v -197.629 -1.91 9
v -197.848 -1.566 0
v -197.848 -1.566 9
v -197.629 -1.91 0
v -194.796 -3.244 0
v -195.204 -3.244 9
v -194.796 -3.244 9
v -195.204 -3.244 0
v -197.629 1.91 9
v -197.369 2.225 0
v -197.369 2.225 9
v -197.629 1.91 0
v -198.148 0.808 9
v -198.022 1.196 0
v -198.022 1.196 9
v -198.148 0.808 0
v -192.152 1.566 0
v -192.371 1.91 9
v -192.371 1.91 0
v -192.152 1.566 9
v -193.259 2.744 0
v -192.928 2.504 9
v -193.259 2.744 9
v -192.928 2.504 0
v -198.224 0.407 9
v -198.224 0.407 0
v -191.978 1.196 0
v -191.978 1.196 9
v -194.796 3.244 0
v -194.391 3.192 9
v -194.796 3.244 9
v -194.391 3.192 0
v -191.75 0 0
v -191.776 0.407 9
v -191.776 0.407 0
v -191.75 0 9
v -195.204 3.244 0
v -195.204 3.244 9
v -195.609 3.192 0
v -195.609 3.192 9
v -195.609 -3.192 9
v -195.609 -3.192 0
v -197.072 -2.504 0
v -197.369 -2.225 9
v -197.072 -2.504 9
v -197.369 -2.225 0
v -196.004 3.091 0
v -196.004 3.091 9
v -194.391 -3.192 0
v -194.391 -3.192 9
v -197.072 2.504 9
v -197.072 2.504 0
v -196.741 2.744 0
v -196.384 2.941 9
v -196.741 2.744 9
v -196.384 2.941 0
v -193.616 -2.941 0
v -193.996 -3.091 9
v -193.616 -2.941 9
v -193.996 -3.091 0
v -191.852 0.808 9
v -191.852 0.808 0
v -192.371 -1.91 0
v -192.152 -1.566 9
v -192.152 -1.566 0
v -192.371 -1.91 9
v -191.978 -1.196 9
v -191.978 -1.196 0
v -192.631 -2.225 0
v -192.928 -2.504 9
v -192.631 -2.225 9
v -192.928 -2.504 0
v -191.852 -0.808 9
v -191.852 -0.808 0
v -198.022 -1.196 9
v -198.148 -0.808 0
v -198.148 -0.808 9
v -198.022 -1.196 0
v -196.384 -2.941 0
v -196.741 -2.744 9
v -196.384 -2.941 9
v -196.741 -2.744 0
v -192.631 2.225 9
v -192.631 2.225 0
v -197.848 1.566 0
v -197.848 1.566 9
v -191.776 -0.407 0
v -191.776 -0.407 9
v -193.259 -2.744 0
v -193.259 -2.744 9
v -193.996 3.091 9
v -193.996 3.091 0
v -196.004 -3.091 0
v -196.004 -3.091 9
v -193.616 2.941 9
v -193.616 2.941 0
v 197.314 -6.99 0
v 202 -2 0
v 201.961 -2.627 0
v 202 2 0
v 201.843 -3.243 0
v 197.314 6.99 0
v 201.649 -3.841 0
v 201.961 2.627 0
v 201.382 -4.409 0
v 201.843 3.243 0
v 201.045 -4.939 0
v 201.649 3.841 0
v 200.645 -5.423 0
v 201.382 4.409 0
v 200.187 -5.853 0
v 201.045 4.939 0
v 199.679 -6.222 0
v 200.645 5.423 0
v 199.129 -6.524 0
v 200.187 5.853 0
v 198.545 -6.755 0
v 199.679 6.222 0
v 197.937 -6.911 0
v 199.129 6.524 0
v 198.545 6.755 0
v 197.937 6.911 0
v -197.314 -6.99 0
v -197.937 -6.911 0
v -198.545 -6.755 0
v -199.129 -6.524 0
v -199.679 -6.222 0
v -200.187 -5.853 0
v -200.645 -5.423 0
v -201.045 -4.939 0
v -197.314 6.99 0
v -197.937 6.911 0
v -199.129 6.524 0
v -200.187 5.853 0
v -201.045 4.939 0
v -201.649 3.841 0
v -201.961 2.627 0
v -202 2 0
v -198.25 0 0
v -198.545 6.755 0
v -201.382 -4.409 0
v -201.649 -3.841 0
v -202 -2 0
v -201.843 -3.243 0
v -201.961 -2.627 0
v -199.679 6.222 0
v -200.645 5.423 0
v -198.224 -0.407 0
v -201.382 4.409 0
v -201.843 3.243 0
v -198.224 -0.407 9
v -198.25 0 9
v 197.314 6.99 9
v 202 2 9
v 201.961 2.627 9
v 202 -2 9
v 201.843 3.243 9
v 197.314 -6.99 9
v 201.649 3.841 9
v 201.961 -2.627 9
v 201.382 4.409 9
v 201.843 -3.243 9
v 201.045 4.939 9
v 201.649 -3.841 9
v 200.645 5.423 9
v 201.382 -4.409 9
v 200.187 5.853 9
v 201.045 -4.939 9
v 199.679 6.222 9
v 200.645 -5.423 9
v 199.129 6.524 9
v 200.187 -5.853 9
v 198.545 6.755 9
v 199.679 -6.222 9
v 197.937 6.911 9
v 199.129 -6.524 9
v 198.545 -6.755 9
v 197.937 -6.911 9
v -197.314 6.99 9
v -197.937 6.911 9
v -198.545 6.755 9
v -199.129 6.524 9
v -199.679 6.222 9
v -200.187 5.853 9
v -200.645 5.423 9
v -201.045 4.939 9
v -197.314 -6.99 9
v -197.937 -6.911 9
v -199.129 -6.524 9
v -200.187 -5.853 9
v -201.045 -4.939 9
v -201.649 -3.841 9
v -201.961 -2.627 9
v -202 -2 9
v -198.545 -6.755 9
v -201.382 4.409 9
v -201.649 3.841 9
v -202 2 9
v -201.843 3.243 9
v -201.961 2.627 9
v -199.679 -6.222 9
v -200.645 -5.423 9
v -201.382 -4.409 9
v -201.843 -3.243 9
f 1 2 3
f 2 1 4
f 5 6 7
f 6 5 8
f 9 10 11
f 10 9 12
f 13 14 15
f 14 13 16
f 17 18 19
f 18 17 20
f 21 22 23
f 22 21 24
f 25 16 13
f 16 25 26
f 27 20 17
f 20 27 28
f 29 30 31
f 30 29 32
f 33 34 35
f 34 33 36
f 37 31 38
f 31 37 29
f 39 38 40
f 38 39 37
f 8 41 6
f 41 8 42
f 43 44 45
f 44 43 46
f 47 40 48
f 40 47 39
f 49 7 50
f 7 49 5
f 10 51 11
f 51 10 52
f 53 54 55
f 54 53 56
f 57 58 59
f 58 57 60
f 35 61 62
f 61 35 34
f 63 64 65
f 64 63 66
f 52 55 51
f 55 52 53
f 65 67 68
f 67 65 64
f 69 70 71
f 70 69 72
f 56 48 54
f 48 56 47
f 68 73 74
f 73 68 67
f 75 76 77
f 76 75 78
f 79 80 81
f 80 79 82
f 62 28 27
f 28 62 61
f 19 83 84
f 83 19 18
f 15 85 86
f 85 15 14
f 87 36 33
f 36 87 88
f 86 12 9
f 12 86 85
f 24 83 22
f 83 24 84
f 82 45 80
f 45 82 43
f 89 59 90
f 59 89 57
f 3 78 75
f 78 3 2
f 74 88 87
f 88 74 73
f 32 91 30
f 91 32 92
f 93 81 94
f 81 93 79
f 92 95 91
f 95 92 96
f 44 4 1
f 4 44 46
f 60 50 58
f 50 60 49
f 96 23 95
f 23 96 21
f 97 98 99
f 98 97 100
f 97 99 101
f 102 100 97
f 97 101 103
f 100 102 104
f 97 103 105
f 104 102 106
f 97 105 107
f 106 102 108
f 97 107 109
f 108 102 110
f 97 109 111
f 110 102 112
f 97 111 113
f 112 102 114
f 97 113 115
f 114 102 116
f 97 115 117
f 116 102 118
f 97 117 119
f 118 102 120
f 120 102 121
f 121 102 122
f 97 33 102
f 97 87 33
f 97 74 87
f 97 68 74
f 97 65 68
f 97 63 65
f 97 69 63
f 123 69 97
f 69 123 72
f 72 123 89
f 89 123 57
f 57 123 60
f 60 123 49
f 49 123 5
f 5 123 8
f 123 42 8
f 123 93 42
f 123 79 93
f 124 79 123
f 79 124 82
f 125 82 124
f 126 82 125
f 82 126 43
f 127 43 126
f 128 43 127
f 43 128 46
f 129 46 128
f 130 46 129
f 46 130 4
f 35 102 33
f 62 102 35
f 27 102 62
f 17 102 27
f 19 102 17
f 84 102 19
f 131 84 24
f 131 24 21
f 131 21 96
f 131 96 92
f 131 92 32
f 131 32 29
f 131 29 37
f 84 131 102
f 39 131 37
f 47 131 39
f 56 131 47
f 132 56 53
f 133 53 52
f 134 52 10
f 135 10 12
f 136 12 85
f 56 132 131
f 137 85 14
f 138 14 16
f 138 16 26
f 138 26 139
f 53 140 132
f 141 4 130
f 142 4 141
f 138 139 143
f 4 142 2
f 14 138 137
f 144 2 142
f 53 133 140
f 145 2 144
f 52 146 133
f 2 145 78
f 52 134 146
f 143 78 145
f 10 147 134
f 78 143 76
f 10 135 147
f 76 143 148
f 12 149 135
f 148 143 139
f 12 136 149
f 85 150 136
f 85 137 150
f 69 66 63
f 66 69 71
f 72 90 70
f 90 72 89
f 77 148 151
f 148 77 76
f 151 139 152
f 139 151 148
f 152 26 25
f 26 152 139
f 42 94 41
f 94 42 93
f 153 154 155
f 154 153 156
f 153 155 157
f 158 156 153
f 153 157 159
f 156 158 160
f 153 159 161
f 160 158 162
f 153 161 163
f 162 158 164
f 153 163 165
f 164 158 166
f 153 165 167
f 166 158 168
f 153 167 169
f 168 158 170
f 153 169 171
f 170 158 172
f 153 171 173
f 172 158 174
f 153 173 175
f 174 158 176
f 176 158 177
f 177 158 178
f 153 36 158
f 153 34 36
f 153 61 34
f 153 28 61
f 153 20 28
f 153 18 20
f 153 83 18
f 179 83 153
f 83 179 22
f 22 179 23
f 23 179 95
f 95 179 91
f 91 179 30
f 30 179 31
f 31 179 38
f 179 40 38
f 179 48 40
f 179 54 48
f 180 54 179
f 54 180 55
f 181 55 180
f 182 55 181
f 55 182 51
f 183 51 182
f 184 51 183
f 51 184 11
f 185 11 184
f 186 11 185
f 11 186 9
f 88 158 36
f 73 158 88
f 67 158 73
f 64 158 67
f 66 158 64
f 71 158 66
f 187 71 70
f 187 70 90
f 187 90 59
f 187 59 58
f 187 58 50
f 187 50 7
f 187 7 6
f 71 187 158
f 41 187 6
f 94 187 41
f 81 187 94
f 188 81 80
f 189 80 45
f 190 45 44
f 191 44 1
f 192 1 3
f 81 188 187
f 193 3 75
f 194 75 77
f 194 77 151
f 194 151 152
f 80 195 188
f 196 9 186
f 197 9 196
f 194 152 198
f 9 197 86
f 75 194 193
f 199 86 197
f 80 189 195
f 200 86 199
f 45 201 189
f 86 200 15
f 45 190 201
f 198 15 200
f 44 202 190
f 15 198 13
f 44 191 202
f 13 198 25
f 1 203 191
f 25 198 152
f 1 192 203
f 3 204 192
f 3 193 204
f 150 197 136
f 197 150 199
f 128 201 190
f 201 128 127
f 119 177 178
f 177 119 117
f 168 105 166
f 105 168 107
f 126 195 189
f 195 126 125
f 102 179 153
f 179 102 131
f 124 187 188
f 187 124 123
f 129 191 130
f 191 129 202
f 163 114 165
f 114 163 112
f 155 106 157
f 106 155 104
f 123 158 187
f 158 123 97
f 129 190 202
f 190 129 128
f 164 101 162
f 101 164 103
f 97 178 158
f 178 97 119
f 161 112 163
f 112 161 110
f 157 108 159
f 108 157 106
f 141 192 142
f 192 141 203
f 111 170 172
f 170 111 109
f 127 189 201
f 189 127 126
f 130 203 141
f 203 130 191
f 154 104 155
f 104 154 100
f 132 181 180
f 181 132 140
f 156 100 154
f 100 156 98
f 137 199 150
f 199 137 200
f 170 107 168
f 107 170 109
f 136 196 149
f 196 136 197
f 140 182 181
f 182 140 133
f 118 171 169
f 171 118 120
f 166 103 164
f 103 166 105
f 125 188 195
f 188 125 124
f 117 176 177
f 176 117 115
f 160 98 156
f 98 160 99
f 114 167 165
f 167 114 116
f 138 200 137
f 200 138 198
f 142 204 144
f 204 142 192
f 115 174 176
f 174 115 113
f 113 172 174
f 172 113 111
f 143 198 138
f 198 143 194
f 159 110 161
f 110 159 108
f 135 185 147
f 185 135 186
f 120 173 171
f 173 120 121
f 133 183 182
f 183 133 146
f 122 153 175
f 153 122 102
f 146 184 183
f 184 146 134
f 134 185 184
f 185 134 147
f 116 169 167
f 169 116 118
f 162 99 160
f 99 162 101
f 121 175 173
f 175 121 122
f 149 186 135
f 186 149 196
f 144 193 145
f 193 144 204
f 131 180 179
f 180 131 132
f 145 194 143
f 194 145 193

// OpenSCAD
$fn = 50;


difference() {
	union() {
		hull() {
			translate(v = [-197.0000000000, 2.0000000000, 0]) {
				cylinder(h = 9, r = 5);
			}
			translate(v = [197.0000000000, 2.0000000000, 0]) {
				cylinder(h = 9, r = 5);
			}
			translate(v = [-197.0000000000, -2.0000000000, 0]) {
				cylinder(h = 9, r = 5);
			}
			translate(v = [197.0000000000, -2.0000000000, 0]) {
				cylinder(h = 9, r = 5);
			}
		}
	}
	union() {
		translate(v = [-195.0000000000, 0.0000000000, 0]) {
			cylinder(h = 9, r = 3.2500000000);
		}
		translate(v = [-195.0000000000, 0.0000000000, 0]) {
			cylinder(h = 9, r = 1.8000000000);
		}
		translate(v = [-195.0000000000, 0.0000000000, 0]) {
			cylinder(h = 9, r = 1.8000000000);
		}
		translate(v = [-195.0000000000, 0.0000000000, 0]) {
			cylinder(h = 9, r = 1.8000000000);
		}
	}
}
